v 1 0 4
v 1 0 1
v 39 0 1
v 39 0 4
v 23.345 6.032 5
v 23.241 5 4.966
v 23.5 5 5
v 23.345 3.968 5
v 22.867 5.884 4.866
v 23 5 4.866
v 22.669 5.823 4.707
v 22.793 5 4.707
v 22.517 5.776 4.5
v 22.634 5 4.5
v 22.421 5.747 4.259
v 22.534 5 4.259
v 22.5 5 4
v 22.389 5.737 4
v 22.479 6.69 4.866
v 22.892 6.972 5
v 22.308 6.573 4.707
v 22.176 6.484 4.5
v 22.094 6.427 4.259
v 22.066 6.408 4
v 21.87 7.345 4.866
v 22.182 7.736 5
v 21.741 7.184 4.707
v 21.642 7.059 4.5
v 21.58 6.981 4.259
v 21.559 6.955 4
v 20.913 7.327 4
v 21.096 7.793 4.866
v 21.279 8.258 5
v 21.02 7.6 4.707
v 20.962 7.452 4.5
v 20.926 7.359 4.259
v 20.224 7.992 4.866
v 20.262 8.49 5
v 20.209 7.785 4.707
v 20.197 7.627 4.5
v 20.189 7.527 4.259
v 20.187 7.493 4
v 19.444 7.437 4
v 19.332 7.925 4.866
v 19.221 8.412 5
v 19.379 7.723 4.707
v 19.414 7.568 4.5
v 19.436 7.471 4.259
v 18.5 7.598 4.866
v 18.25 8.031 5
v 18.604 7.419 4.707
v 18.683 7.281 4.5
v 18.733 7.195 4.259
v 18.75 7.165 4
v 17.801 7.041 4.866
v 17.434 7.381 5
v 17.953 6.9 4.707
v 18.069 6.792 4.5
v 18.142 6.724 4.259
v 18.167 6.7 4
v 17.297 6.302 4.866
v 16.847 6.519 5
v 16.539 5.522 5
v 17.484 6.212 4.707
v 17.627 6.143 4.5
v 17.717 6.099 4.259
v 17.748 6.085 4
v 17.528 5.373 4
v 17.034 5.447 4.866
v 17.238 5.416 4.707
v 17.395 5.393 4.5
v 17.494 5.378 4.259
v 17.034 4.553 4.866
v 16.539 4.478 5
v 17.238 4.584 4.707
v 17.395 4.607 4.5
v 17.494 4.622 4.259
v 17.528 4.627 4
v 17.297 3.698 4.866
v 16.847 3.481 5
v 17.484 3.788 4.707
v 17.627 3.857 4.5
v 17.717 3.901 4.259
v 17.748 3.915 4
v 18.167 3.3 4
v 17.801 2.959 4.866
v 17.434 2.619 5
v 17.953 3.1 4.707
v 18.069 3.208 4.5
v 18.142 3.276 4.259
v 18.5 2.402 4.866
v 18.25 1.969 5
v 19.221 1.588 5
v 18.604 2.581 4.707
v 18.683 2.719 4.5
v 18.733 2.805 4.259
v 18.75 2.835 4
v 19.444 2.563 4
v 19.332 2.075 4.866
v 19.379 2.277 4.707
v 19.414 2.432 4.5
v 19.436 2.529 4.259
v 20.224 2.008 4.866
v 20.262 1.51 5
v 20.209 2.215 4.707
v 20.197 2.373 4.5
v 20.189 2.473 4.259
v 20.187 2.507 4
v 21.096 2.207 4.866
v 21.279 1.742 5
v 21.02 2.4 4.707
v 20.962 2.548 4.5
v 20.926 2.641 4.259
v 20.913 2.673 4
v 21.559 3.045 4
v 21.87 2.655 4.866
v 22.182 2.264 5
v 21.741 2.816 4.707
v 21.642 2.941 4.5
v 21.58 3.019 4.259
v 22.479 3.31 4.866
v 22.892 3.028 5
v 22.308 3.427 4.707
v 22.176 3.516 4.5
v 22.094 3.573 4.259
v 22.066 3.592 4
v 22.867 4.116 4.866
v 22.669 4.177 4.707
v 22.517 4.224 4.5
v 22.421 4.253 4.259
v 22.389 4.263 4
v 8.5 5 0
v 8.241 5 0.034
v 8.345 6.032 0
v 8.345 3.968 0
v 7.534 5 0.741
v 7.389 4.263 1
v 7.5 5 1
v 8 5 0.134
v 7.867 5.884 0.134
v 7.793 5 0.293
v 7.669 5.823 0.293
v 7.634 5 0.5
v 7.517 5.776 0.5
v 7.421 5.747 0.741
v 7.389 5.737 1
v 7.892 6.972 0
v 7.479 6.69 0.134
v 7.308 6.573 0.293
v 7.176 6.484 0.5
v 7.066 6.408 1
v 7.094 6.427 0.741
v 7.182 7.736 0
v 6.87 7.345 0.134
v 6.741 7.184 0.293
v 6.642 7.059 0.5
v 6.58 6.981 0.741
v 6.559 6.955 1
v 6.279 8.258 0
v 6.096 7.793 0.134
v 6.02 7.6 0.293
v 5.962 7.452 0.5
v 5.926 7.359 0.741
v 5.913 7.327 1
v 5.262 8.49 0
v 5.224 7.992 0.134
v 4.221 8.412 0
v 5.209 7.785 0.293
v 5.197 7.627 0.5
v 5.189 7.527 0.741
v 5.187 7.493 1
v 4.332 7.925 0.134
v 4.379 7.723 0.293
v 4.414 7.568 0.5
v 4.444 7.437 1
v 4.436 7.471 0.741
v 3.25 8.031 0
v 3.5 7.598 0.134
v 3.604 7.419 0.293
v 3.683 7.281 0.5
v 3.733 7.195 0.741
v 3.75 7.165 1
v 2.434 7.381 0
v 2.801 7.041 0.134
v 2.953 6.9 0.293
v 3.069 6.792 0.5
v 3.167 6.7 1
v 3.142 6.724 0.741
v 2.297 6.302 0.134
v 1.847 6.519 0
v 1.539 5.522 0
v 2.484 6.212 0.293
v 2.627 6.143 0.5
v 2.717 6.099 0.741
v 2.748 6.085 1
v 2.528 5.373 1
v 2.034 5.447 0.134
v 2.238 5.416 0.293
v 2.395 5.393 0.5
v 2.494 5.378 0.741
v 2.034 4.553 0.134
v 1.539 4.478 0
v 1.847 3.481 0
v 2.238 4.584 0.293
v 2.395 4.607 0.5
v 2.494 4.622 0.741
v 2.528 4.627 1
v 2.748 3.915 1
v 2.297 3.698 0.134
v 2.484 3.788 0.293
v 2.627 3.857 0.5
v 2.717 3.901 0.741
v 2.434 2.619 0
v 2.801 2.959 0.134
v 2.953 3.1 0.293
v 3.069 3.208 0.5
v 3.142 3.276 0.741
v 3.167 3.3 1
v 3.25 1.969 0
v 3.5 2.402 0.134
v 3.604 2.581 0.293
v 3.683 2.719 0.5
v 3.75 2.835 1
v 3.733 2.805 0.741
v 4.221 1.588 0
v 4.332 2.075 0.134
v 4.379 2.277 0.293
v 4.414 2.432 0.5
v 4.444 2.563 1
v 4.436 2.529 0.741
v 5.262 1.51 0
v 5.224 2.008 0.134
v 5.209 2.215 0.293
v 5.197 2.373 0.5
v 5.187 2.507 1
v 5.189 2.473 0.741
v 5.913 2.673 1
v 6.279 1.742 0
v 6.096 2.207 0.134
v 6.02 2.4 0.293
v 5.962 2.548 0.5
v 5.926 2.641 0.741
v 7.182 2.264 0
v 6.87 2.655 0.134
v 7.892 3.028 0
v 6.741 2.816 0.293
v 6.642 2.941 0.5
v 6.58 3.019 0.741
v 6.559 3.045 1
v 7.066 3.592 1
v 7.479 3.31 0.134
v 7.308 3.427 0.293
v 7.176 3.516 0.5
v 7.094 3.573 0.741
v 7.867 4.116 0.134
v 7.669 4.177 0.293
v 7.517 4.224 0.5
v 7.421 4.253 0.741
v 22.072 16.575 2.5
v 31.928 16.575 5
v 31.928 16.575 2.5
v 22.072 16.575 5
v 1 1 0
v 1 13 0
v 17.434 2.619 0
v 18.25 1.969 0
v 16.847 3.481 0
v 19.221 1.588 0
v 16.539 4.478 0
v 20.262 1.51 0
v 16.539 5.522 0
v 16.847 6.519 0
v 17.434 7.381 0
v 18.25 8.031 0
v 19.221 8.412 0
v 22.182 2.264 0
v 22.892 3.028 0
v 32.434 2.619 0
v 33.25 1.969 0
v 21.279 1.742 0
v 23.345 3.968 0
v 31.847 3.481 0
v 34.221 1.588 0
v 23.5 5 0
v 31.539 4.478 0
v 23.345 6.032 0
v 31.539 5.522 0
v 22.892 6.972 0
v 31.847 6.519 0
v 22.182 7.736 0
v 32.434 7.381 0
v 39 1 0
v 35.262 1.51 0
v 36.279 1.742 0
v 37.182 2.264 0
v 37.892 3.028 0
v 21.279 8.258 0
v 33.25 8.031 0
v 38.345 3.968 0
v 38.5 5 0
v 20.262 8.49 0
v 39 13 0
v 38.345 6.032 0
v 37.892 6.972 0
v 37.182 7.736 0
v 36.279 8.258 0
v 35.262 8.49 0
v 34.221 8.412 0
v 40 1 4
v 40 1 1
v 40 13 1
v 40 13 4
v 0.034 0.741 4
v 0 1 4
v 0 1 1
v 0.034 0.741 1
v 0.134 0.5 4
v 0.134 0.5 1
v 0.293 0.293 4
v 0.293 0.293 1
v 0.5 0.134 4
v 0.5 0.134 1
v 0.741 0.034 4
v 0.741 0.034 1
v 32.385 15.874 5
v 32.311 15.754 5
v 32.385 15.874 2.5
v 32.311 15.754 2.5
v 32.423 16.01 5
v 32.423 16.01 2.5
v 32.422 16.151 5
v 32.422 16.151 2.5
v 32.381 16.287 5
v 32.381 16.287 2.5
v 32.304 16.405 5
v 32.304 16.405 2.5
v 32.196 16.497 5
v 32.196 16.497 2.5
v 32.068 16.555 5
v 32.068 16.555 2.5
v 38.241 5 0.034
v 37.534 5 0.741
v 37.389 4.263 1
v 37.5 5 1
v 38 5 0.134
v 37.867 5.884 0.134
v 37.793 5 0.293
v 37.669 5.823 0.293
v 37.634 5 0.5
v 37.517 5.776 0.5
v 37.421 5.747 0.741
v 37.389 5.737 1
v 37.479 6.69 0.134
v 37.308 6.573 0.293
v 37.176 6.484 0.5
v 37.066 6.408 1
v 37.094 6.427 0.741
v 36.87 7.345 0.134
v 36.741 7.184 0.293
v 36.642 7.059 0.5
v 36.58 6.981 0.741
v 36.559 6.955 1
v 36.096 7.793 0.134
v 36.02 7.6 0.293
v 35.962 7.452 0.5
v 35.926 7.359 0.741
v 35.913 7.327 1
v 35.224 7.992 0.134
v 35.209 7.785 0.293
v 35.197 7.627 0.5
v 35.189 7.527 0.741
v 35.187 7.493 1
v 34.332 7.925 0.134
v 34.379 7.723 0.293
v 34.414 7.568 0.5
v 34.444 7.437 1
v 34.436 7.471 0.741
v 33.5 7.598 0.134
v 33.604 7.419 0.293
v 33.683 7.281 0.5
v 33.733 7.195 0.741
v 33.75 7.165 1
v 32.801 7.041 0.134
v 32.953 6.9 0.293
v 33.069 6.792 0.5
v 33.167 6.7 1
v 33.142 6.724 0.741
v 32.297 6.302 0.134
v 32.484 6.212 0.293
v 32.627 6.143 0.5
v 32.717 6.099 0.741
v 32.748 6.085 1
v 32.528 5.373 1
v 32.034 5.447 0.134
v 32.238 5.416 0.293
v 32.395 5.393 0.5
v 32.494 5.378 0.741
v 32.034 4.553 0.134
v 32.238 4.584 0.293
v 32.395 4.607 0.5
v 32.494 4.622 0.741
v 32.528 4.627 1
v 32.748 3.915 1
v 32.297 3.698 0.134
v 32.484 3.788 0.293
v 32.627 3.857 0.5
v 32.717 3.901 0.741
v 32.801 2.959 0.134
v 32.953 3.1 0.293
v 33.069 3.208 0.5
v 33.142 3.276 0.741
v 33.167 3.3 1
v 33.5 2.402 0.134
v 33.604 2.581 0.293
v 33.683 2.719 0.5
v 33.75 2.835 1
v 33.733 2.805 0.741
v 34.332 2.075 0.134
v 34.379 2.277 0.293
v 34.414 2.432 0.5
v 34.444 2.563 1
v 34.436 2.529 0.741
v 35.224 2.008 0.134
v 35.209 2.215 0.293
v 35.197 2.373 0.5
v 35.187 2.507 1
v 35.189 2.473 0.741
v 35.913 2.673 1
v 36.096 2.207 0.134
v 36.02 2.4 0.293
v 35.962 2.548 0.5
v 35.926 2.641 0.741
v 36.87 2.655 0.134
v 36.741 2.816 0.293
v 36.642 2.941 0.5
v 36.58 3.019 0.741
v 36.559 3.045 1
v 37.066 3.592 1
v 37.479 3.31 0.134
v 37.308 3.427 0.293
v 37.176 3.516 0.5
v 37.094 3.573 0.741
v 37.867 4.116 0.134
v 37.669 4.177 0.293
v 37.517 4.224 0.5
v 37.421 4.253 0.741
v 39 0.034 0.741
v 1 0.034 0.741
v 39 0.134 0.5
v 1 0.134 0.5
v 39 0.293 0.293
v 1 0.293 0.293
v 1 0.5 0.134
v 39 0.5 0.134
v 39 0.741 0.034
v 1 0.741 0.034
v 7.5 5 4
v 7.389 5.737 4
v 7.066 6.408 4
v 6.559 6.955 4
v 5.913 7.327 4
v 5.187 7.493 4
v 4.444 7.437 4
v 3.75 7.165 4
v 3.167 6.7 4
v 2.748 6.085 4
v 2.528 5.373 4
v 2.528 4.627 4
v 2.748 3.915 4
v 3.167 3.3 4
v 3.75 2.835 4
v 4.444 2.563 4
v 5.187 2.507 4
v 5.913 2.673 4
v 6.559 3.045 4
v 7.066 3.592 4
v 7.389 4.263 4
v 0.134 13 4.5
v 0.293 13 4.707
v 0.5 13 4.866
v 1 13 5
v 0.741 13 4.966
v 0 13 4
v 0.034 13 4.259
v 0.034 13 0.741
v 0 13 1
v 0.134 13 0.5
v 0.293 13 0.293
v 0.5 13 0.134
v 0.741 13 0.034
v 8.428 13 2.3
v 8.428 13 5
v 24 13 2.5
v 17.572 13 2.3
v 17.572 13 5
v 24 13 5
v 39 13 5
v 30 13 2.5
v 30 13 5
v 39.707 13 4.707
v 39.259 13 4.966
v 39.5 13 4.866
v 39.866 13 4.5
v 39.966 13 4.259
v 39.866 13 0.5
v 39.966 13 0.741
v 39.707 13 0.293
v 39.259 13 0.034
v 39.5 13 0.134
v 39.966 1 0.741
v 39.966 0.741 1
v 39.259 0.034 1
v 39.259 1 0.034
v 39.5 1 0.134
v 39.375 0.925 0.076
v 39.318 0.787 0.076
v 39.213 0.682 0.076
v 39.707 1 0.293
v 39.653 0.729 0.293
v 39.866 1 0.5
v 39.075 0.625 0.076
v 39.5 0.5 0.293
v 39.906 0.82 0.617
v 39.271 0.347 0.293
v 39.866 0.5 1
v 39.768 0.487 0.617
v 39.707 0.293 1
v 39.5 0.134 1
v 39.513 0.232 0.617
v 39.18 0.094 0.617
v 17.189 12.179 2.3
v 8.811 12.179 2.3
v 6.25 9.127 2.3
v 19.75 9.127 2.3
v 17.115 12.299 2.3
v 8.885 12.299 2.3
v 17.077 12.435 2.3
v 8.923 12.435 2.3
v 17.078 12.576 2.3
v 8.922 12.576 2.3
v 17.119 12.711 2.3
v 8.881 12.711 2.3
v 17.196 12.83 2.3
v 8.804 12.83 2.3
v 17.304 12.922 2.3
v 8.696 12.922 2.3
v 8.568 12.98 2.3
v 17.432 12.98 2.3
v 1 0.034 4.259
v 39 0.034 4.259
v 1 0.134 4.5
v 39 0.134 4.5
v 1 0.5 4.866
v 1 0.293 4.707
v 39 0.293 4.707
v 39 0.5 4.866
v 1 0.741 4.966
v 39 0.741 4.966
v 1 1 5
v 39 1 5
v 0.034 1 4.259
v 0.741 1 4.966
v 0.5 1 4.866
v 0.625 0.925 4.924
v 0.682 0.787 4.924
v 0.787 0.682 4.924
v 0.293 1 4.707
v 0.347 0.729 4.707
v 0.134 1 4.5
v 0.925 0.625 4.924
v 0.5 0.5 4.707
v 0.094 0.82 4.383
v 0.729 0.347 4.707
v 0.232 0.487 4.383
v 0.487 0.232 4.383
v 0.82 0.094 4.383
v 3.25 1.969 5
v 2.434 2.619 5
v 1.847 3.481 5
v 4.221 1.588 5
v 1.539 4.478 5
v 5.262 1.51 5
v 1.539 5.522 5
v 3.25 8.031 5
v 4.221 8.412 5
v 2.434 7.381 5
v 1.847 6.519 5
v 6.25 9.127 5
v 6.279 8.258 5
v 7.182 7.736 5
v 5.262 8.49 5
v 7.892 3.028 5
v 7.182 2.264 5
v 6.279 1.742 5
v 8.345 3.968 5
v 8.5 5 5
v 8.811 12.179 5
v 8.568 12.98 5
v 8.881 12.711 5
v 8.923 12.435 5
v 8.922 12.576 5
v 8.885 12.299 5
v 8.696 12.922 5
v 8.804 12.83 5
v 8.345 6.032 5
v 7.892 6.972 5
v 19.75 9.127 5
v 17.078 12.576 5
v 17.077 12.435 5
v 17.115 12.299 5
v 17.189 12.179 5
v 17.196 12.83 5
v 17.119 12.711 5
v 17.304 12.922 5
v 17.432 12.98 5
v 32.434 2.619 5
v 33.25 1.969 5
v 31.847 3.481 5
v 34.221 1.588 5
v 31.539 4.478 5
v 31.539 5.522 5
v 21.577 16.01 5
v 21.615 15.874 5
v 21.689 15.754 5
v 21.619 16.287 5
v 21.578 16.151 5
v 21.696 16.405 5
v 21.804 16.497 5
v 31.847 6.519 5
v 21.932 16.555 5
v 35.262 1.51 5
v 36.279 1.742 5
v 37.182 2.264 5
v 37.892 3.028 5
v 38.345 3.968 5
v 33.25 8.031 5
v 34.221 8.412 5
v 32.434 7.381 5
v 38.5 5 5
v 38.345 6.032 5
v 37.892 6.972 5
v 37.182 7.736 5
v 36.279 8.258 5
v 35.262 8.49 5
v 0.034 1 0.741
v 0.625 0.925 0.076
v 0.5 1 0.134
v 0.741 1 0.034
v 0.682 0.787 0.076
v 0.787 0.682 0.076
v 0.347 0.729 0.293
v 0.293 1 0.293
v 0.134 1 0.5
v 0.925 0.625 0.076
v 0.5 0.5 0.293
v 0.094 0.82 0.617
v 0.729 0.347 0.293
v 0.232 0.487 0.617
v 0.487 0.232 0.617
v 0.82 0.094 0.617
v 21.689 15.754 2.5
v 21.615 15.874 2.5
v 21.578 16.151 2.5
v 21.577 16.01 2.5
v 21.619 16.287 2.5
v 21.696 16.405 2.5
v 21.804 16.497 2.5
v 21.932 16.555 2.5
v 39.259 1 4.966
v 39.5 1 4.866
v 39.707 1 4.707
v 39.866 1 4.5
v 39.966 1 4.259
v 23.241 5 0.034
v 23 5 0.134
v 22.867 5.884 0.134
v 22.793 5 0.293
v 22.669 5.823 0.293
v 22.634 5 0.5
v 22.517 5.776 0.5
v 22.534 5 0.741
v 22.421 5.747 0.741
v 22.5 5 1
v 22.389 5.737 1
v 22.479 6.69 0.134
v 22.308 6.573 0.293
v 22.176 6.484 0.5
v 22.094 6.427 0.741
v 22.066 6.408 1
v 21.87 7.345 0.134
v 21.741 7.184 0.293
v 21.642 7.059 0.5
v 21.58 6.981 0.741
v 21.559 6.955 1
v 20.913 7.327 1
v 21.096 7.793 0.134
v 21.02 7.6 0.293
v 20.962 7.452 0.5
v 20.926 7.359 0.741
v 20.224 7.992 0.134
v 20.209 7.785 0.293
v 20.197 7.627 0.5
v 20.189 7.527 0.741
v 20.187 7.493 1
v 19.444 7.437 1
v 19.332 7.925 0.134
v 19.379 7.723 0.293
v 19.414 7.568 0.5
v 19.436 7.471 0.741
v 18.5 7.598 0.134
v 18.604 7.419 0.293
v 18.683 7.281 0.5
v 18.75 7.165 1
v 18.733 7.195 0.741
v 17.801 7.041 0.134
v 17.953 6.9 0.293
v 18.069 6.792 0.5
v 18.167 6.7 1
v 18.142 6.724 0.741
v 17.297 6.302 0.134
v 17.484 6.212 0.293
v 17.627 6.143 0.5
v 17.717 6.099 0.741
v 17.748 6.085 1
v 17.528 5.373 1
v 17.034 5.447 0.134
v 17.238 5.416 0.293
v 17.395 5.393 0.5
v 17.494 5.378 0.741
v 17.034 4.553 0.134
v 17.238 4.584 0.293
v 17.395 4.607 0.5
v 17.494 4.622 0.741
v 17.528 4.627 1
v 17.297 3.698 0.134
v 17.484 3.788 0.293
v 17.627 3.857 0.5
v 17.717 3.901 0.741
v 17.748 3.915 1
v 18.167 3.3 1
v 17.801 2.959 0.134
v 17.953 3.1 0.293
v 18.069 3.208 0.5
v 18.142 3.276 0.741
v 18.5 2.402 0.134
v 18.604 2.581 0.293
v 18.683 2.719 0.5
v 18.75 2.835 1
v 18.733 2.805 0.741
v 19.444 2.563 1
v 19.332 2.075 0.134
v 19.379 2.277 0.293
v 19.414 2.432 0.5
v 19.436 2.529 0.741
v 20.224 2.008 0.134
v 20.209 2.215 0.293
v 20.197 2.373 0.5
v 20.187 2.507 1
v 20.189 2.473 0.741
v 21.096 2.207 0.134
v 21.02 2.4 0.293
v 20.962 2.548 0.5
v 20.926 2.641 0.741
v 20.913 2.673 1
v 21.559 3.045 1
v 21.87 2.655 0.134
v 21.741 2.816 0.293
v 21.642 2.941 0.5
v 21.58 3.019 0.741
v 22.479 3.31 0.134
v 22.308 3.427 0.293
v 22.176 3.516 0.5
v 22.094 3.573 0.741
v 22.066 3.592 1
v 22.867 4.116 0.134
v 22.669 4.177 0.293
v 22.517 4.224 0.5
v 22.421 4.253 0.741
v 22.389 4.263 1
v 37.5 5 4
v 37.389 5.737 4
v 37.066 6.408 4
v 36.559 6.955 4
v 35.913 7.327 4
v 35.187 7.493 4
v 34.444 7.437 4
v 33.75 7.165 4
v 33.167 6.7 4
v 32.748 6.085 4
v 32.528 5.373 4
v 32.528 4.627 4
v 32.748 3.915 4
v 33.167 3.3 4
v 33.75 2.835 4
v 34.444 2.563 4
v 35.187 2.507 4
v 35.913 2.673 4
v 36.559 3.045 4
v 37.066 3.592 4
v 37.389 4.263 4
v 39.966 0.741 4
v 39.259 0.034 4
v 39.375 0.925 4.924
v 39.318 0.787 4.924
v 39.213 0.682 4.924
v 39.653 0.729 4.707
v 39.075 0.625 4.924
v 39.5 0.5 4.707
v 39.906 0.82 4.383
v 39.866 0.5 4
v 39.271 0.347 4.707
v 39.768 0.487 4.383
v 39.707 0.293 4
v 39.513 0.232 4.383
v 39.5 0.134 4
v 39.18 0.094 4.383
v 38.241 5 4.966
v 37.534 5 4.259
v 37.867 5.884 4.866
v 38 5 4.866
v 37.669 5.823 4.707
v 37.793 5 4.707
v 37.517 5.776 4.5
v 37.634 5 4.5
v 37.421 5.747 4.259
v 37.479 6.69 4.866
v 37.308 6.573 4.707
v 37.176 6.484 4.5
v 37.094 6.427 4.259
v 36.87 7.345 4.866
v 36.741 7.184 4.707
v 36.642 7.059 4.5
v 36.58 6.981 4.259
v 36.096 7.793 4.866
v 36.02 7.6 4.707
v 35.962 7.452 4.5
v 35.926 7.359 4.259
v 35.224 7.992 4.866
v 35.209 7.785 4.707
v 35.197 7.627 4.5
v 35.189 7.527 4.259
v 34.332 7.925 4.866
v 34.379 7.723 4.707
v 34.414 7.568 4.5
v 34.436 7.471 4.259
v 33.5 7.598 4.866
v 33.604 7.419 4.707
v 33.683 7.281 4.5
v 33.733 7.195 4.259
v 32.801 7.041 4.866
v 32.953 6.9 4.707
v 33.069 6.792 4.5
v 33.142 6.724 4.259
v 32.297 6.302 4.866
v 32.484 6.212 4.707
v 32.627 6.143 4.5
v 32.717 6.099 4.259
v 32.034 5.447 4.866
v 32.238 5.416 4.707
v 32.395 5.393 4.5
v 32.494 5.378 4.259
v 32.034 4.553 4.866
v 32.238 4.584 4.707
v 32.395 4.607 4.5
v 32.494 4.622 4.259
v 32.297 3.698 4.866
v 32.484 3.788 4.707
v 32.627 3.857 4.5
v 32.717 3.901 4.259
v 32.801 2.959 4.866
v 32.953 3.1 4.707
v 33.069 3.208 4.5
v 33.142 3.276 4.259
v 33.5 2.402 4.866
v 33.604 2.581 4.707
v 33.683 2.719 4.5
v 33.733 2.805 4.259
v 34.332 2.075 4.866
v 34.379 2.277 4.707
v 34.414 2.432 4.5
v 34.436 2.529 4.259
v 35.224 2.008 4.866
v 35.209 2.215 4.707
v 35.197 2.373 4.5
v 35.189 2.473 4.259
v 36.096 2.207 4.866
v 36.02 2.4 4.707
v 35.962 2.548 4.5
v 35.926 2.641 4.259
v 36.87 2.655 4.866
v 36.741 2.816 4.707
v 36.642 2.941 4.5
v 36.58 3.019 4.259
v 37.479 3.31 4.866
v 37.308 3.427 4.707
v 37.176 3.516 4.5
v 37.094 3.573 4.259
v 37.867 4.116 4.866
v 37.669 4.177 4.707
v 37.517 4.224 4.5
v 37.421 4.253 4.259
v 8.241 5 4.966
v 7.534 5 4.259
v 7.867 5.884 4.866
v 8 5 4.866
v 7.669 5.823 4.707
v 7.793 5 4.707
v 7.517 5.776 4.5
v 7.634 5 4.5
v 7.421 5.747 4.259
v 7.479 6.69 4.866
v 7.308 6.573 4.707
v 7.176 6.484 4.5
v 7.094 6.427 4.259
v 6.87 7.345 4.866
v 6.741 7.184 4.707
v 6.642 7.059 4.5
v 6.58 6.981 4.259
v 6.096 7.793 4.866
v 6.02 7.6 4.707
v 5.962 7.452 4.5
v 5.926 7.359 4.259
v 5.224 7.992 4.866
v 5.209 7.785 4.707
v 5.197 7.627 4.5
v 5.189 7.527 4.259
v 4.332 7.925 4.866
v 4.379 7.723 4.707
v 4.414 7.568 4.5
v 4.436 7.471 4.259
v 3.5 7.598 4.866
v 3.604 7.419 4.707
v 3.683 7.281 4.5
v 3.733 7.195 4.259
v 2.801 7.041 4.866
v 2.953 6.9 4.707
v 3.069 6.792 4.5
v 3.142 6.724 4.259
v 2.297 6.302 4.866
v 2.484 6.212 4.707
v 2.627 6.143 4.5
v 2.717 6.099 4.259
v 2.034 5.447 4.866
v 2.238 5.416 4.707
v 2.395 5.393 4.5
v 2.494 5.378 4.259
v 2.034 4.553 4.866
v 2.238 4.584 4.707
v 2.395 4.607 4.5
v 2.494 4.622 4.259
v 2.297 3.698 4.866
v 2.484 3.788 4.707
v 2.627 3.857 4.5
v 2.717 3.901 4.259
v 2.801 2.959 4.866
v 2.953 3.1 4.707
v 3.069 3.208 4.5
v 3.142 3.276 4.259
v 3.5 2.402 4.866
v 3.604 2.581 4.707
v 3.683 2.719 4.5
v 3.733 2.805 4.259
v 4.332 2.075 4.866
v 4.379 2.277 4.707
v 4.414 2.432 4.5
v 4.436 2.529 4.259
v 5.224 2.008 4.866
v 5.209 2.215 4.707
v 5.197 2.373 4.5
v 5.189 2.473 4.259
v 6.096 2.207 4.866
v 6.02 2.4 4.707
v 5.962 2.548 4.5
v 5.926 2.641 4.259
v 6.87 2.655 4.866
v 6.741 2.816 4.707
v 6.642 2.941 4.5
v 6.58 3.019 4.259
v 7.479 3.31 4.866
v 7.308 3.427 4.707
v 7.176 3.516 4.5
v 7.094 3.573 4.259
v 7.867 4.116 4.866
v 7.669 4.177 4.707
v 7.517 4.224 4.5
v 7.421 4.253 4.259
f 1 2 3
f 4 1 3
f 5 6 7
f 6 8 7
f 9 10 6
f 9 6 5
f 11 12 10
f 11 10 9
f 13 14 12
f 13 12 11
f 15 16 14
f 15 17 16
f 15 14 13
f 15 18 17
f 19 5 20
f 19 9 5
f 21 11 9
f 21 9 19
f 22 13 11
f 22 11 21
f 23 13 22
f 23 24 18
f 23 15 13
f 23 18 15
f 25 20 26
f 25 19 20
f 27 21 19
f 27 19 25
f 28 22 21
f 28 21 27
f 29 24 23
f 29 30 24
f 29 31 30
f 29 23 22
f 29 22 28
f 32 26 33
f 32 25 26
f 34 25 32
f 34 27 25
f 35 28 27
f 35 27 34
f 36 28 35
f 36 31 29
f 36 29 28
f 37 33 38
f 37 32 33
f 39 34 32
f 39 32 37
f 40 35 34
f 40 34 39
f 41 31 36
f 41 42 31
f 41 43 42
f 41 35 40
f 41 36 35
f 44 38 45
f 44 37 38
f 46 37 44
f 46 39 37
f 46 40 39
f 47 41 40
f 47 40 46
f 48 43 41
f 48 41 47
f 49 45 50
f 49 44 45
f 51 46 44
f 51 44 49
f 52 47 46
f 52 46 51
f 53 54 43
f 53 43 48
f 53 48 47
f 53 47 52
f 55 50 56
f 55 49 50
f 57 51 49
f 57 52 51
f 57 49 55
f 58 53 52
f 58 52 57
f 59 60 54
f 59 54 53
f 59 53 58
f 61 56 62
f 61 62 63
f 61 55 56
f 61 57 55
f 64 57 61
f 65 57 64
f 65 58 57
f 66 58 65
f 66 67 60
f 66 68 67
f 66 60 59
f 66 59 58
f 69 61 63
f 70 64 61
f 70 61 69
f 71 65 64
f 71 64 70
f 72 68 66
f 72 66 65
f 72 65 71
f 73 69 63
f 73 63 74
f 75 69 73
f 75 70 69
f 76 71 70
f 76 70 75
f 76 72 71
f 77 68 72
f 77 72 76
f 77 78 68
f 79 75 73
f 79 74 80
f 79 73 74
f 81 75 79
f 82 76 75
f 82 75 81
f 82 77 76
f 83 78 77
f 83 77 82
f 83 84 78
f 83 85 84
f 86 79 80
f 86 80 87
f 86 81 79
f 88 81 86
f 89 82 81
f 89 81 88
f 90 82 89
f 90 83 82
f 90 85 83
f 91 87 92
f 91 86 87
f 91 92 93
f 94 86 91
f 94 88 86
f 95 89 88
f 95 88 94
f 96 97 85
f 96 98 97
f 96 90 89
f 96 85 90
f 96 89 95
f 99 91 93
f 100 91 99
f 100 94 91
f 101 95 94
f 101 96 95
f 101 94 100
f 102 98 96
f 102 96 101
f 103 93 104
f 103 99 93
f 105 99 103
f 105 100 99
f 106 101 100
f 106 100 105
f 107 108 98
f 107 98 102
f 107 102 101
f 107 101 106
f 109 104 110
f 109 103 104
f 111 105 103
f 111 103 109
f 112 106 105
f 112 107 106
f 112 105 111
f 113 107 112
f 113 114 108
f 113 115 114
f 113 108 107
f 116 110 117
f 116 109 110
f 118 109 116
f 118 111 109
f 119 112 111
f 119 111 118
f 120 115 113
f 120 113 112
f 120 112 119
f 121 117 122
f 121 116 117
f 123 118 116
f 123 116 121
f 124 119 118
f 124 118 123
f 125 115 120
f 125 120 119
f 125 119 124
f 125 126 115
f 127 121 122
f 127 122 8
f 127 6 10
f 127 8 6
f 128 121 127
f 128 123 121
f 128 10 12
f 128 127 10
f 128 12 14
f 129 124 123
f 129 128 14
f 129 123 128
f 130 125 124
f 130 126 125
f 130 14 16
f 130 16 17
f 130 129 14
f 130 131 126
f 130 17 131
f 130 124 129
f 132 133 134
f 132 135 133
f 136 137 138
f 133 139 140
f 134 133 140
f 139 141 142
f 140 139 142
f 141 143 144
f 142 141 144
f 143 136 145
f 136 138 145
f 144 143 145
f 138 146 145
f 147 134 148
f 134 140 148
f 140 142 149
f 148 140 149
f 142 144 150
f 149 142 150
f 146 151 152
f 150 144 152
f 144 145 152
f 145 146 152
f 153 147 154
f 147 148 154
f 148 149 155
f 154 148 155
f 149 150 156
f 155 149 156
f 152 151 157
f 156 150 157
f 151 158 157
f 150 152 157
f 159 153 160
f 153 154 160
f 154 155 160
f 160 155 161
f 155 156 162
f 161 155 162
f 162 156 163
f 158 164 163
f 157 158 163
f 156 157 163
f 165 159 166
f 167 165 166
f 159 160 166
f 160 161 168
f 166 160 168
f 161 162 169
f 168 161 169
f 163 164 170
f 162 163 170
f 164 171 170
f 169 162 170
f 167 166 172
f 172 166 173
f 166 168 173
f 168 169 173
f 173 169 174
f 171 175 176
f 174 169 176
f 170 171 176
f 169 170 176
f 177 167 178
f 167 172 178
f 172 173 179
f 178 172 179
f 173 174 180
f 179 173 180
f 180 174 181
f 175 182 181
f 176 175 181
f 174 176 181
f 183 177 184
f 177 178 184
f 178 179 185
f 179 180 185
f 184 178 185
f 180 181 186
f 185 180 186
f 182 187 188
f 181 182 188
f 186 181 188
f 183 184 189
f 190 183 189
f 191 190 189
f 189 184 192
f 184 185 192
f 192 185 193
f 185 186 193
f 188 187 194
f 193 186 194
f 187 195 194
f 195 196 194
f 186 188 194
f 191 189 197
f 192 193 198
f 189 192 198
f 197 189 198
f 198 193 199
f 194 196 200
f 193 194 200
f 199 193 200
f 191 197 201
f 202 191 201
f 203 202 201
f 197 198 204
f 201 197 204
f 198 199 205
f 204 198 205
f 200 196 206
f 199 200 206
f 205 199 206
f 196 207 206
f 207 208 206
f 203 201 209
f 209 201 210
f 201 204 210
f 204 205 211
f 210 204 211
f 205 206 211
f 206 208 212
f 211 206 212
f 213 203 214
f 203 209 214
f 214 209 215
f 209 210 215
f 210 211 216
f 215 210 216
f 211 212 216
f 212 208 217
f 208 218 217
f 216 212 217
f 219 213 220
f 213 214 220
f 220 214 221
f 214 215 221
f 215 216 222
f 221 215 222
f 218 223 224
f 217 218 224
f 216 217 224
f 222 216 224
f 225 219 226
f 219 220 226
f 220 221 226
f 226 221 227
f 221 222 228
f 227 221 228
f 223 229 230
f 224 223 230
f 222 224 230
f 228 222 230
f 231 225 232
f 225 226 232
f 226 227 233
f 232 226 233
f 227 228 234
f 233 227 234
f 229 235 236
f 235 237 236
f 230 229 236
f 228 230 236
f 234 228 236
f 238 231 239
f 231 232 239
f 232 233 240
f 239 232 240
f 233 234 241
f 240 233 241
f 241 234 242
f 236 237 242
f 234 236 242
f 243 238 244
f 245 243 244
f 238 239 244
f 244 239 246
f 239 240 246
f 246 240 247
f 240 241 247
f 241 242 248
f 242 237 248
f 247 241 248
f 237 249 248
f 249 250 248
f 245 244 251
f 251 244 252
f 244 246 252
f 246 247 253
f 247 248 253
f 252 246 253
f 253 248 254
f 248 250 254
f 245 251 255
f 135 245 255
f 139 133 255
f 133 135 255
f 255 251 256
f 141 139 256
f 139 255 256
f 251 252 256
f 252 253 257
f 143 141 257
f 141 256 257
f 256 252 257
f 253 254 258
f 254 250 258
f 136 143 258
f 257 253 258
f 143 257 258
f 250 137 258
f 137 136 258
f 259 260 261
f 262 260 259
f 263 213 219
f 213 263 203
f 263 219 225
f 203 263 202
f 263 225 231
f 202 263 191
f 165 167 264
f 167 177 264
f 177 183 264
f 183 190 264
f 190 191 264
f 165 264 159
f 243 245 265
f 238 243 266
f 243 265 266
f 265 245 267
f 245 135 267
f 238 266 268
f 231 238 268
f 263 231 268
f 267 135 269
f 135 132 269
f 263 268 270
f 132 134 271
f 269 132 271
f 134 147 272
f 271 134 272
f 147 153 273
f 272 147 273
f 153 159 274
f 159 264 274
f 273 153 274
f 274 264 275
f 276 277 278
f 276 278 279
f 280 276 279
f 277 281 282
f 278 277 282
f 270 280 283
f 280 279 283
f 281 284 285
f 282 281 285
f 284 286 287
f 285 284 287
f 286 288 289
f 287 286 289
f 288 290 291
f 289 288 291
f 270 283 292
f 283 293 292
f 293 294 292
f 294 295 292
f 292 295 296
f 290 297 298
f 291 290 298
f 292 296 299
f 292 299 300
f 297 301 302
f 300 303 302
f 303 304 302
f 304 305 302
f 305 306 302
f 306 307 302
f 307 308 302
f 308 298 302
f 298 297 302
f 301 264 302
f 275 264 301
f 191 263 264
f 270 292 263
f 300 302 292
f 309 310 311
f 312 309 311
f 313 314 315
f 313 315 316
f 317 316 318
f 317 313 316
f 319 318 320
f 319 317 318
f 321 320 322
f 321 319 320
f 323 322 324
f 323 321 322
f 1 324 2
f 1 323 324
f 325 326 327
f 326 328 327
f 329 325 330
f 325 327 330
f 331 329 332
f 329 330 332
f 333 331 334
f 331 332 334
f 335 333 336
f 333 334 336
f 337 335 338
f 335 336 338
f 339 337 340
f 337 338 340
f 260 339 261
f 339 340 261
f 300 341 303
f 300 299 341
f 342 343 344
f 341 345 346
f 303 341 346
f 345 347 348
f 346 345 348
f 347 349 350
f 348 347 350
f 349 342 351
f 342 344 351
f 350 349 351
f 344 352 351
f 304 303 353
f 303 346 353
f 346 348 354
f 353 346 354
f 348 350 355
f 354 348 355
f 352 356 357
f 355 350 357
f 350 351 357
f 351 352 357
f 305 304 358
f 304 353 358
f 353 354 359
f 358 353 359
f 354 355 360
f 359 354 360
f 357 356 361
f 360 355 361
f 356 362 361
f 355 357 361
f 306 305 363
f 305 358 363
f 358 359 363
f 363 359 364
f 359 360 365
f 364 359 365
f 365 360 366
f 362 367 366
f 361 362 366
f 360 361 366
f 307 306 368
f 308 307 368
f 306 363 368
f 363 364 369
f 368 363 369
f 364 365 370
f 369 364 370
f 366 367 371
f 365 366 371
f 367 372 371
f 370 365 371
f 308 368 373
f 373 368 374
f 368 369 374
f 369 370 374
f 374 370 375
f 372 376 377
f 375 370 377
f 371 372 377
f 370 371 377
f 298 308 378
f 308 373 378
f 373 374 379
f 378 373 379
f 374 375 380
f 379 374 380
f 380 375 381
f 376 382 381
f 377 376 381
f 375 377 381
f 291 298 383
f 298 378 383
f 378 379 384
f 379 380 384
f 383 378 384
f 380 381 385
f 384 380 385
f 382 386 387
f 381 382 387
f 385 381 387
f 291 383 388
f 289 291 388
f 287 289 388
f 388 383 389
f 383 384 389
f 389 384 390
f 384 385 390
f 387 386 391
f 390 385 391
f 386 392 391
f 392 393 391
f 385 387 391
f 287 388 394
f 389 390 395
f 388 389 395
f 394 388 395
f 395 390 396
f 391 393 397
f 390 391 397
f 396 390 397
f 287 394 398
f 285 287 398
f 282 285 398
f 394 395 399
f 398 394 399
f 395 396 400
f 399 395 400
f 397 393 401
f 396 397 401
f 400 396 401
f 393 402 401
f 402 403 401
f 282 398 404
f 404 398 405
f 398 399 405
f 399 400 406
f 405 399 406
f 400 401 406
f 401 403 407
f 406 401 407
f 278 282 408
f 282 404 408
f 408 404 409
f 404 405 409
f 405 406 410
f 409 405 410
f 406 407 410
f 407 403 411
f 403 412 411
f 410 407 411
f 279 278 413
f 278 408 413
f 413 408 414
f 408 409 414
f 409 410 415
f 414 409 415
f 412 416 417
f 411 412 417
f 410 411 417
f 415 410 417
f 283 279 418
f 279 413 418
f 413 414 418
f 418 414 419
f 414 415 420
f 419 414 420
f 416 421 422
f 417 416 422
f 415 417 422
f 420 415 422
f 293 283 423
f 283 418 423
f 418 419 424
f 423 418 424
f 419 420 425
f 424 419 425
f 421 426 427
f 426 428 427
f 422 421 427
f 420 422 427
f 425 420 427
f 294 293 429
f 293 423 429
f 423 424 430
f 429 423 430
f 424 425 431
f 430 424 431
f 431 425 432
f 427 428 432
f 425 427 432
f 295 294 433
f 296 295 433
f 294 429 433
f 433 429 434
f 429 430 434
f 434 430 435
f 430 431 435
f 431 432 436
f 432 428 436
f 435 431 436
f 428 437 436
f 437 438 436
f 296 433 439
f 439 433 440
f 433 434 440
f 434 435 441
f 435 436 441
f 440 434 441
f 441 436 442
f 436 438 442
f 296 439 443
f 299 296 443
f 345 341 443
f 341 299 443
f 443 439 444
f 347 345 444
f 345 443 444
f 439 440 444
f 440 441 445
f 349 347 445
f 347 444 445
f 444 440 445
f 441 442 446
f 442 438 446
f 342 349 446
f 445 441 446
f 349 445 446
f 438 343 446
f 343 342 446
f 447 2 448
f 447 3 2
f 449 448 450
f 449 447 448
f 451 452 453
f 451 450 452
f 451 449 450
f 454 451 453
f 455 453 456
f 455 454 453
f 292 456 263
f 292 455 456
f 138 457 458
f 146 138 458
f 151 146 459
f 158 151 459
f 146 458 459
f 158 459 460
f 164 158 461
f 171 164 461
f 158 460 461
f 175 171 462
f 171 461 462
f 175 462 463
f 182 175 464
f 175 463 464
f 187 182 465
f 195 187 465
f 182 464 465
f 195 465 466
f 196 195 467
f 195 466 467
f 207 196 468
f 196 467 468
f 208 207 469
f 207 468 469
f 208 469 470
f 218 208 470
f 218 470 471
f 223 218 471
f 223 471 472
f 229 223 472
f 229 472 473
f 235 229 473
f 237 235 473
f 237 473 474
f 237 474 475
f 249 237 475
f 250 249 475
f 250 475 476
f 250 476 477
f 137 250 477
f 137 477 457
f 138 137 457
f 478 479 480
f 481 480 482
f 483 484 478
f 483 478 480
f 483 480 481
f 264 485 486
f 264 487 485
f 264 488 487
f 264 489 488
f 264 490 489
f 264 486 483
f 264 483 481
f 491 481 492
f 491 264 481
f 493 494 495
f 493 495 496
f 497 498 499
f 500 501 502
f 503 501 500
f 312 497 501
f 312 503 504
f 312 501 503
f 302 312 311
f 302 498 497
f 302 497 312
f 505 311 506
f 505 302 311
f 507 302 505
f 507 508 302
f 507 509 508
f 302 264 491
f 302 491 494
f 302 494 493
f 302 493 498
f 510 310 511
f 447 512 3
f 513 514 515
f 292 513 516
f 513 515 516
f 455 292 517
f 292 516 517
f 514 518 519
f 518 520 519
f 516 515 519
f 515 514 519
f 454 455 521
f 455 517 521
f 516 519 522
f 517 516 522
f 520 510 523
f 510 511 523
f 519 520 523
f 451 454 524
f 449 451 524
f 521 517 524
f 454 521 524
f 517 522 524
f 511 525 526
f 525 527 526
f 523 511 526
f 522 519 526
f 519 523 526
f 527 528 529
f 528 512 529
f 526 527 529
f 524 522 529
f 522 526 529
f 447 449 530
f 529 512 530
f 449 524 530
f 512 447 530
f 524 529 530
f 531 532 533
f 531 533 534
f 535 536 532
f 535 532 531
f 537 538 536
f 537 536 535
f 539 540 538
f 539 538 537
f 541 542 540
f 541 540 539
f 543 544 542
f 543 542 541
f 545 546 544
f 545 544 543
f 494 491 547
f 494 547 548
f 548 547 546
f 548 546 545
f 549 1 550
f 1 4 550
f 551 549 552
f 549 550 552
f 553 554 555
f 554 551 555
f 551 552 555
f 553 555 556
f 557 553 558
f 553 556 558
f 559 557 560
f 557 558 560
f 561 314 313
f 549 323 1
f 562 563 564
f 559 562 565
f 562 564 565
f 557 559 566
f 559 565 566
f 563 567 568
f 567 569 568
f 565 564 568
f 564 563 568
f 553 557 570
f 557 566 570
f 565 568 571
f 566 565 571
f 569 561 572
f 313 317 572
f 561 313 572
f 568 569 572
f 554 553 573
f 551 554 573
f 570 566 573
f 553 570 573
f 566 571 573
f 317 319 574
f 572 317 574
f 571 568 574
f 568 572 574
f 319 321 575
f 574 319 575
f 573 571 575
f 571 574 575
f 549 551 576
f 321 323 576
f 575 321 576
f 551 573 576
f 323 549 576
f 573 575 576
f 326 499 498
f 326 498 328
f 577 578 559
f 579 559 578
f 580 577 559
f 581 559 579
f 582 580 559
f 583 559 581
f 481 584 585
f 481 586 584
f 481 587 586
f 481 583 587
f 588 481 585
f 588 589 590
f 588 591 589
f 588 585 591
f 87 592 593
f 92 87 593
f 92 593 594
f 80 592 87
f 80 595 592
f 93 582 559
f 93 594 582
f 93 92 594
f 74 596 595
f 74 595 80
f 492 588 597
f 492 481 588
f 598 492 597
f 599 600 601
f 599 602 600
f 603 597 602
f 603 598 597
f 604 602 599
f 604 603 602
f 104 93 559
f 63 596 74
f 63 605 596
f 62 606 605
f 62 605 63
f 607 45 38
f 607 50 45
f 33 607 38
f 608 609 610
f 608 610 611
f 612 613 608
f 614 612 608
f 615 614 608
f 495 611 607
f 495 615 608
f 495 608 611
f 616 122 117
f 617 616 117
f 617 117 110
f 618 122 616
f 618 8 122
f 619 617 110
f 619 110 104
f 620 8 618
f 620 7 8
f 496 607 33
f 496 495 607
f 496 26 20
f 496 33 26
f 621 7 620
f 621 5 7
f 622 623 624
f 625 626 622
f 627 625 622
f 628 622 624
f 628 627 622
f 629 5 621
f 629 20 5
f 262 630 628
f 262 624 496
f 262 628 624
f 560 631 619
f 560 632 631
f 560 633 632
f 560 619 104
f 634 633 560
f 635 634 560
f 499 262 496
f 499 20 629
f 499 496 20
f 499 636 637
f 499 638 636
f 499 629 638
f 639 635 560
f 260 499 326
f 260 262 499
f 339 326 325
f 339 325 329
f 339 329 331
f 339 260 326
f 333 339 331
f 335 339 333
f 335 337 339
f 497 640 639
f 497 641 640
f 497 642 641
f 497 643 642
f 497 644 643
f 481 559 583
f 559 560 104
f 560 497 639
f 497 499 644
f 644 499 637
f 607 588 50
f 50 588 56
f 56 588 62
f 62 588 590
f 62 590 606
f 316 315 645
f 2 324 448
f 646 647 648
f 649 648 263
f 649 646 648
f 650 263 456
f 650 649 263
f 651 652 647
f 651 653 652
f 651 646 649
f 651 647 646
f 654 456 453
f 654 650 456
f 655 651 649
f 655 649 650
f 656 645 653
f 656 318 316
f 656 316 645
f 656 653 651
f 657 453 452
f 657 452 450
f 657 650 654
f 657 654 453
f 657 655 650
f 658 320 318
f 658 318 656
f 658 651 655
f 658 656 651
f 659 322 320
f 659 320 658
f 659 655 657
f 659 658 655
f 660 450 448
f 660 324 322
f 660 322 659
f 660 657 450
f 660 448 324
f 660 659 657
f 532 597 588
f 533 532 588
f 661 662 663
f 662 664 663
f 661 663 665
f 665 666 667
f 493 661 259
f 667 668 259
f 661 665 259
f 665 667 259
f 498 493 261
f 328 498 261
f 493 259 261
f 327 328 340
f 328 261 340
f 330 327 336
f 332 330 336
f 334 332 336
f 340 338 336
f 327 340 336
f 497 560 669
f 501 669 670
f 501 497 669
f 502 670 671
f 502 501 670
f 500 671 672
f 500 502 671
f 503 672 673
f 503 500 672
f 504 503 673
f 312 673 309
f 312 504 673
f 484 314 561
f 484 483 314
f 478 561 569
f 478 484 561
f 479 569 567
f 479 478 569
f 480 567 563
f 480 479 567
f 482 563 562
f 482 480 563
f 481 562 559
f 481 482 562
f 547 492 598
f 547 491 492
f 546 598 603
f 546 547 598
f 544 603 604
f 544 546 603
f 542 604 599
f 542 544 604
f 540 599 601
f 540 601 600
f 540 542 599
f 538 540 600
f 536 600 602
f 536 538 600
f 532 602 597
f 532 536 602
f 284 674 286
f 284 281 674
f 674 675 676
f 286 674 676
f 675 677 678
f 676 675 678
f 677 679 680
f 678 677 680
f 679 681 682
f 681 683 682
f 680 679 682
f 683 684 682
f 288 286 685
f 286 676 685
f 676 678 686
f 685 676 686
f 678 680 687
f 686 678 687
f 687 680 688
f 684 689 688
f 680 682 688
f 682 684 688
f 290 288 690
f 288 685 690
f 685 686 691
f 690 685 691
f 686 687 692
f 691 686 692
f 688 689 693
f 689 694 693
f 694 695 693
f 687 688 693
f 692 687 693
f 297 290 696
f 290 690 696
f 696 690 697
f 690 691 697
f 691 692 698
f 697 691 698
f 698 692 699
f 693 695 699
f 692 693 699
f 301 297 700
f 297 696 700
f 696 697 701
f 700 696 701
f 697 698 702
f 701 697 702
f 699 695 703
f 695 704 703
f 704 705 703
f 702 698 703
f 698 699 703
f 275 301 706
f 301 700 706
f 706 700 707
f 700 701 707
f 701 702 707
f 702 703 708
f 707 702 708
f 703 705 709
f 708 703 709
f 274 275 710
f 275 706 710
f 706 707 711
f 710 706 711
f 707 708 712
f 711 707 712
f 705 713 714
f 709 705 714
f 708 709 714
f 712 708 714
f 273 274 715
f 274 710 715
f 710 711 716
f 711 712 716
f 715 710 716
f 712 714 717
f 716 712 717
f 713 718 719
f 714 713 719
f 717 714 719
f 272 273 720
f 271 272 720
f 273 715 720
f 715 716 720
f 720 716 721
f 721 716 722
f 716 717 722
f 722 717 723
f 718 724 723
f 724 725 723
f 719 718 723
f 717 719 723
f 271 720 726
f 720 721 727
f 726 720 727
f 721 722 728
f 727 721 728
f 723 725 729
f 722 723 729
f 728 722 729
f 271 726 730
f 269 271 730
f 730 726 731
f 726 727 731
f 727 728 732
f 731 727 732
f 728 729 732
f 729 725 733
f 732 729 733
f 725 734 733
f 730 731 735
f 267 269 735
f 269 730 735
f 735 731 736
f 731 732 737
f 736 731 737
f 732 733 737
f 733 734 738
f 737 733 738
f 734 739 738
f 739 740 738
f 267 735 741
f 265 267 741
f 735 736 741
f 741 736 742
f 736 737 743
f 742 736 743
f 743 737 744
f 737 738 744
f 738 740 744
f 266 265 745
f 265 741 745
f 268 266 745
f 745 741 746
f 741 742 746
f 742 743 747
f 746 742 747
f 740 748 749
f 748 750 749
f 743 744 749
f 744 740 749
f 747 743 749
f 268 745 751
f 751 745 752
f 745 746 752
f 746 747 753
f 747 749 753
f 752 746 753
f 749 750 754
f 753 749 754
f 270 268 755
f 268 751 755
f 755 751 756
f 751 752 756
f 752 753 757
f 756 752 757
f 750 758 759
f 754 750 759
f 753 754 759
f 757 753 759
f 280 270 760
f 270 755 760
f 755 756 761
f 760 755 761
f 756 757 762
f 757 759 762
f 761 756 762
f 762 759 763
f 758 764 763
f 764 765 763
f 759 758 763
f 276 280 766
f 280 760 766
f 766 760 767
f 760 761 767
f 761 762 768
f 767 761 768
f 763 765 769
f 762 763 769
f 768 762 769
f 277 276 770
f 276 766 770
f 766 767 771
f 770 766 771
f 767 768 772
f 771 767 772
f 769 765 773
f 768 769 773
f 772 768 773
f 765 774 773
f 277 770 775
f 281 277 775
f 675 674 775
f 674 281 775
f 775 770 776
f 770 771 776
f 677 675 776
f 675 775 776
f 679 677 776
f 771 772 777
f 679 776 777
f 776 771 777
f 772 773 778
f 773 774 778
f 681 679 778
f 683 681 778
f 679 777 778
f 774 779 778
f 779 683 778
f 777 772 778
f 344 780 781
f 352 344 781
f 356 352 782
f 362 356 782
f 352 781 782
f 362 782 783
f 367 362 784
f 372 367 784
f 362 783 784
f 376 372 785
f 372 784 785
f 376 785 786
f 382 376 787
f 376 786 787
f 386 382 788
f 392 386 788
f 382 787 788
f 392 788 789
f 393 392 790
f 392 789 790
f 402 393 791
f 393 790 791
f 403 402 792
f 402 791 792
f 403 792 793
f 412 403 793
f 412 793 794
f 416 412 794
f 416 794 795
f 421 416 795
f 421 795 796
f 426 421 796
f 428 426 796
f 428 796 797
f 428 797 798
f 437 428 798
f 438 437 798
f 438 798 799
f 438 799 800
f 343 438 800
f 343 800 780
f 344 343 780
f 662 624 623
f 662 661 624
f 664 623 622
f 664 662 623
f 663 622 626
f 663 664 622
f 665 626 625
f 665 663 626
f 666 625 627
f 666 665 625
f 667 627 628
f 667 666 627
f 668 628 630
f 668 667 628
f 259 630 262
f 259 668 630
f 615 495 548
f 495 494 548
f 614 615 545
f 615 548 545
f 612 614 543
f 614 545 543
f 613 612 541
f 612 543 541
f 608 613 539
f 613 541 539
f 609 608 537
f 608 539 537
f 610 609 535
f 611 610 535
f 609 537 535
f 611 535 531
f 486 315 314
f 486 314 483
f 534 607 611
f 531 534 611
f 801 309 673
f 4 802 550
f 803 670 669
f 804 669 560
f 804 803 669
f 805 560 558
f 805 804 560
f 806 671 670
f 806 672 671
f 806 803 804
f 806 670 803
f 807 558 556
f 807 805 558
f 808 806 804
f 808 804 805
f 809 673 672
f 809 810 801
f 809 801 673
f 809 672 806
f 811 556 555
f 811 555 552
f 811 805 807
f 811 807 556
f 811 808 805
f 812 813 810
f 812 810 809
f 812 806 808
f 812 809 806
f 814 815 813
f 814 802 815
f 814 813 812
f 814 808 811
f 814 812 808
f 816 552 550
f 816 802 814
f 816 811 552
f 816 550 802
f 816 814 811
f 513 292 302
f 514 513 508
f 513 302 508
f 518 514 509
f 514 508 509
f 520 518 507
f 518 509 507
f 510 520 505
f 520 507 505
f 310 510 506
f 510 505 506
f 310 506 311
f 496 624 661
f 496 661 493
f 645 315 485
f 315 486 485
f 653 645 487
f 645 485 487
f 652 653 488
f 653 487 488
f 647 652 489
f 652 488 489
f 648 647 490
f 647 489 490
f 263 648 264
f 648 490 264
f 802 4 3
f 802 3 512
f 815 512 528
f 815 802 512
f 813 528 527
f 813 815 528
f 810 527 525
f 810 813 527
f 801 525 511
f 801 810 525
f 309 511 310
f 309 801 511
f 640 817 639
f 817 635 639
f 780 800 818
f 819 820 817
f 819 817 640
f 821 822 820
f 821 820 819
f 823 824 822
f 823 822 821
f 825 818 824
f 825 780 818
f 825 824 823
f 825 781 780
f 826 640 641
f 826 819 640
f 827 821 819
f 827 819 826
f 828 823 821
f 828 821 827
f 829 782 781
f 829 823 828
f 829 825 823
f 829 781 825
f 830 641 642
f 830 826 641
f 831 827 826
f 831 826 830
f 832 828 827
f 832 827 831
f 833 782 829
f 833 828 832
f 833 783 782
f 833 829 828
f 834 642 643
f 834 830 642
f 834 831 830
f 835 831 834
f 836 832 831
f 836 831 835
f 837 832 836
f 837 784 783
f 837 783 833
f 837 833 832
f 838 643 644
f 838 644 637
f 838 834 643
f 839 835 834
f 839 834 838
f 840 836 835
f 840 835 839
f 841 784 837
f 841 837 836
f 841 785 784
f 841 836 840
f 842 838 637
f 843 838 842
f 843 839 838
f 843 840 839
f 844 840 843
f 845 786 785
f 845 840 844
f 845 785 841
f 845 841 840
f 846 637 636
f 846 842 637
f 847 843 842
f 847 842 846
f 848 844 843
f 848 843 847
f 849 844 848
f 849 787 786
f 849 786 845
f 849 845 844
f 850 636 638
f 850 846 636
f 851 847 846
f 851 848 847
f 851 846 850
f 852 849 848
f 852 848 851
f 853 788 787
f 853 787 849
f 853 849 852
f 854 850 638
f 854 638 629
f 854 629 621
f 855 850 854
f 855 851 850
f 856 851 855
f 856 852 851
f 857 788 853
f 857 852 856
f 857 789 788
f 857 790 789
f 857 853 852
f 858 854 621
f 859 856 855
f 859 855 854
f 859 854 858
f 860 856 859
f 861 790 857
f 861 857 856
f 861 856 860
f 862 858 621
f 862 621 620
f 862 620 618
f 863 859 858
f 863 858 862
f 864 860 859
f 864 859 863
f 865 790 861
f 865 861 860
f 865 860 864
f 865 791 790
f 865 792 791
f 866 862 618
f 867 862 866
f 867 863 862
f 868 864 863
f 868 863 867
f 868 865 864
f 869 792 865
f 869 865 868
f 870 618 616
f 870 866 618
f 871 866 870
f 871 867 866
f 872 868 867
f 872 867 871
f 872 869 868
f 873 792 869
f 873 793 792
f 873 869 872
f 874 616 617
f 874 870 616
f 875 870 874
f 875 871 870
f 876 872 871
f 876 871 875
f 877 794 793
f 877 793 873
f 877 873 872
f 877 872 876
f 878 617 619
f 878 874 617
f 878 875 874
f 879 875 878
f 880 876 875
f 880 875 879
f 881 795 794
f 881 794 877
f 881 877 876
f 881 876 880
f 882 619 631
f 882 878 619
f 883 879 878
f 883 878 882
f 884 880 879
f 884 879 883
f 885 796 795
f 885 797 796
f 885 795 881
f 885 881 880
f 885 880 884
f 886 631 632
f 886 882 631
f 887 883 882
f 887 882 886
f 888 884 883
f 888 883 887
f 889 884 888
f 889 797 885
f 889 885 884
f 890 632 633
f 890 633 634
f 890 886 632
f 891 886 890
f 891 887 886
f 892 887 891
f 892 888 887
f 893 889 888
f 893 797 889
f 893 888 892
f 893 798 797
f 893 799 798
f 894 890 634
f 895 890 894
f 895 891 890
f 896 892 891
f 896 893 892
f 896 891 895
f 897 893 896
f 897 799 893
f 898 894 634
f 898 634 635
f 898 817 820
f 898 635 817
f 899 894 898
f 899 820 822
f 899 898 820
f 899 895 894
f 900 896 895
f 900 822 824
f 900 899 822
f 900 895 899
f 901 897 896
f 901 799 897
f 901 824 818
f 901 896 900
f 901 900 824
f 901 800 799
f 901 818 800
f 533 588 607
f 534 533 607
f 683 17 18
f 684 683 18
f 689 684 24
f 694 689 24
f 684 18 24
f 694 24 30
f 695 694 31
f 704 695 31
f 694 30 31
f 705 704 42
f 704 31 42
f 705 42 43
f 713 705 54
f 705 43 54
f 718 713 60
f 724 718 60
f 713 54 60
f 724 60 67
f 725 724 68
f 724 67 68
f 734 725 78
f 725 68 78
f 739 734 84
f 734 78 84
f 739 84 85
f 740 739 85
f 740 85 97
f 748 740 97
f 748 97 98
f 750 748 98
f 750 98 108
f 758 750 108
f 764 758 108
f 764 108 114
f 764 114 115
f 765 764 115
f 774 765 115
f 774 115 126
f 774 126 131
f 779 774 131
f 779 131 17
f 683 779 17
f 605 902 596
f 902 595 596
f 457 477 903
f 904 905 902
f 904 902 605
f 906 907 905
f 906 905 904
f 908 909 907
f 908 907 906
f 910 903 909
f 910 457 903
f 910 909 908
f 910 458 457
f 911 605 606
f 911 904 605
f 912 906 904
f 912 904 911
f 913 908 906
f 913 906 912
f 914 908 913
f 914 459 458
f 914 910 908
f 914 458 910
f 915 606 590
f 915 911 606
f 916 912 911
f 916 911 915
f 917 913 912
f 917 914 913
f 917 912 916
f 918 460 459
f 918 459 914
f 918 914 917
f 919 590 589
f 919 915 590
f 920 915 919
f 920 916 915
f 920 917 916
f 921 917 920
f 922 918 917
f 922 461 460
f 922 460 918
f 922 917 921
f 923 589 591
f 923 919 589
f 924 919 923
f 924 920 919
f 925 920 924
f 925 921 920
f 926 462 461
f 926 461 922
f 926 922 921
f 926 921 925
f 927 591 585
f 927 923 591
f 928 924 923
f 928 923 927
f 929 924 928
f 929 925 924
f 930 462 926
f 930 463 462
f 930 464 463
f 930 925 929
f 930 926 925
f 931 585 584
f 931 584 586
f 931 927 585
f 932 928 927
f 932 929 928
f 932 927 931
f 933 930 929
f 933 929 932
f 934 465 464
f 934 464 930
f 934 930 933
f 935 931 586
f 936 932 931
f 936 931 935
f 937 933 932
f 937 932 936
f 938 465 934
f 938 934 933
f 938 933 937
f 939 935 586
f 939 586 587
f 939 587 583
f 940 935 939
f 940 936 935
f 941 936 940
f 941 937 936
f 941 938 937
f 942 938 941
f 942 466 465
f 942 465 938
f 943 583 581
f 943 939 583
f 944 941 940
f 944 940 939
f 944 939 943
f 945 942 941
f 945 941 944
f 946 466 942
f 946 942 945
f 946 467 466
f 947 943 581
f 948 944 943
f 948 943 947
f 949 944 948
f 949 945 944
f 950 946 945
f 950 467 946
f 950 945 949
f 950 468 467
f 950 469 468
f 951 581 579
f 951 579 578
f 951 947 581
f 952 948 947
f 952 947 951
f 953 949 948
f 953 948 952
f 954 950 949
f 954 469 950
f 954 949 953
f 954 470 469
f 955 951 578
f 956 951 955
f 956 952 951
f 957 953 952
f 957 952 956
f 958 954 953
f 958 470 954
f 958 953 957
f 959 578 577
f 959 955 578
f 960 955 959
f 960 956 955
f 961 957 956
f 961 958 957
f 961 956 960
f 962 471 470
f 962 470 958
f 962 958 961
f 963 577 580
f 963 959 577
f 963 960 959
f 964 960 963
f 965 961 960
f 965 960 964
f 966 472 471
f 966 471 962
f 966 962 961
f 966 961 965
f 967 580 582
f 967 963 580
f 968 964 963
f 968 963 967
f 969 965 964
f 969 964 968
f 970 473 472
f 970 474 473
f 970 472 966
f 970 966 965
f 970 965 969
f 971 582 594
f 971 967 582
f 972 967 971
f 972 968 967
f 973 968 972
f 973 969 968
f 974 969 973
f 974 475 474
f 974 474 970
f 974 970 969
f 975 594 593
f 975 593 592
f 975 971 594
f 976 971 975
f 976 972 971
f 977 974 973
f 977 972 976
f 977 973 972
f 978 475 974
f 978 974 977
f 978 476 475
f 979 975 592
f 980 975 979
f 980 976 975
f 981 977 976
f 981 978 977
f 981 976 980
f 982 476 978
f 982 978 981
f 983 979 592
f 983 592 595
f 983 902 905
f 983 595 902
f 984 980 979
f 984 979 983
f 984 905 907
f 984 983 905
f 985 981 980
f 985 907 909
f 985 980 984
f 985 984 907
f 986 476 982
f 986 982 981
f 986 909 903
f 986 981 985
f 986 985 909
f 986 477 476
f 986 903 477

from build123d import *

# Parameters (mm, degrees)
F0_W     = 40
F0_H     = 13
F1_DEPTH = 5
F2_R     = 2.5
F3_DEPTH = 5.001
F5_DEPTH = 2.5
F7_DEPTH = 2.7
F8_R     = 1
F9_R     = 1
F10_R    = 0.5


with BuildPart() as f1:
    # F0 (on Top) → F1 (new body)
    with BuildSketch(Plane.XY):
        with Locations((20, 6.5)):
            Rectangle(F0_W, F0_H)
    extrude(amount=F1_DEPTH)

    # F2 (on face) → F3 (cut, through all)
    with BuildSketch(Plane.XY.offset(5)):
        with Locations((5, 5)):
            Circle(F2_R)
        with Locations((20, 5)):
            Circle(F2_R)
        with Locations((35, 5)):
            Circle(F2_R)
    extrude(amount=-F3_DEPTH, mode=Mode.SUBTRACT)

    # F4 (on face) → F5 (join)
    with BuildSketch(Plane.XY.offset(5)):
        Polygon((21, 16.5752607778), (24, 13), (30, 13), (33, 16.5752607778), align=None)
    extrude(amount=-F5_DEPTH)

    # F6 (on face) → F7 (cut)
    with BuildSketch(Plane.XY.offset(5)):
        Polygon((16.5, 13), (9.5, 13), (6.25, 9.1268008241), (19.75, 9.1268008241), align=None)
    extrude(amount=-F7_DEPTH, mode=Mode.SUBTRACT)

    # F8
    f8_edges = [f1.edges().sort_by_distance(p)[0] for p in [
        (0, 0, 2.5),
        (40, 0, 2.5),
        (0, 6.5, 5),
        (0, 6.5, 0),
        (40, 6.5, 5),
        (40, 6.5, 0),
        (20, 0, 5),
        (20, 0, 0),
    ]]
    fillet(f8_edges, radius=F8_R)

    # F9
    f9_edges = [f1.edges().sort_by_distance(p)[0] for p in [
        (2.5, 5, 5),
        (17.5, 5, 5),
        (32.5, 5, 5),
        (2.5, 5, 0),
        (17.5, 5, 0),
        (32.5, 5, 0),
    ]]
    fillet(f9_edges, radius=F9_R)

    # F10
    f10_edges = [f1.edges().sort_by_distance(p)[0] for p in [
        (21, 16.575261, 3.75),
        (33, 16.575261, 3.75),
        (9.5, 13, 3.65),
        (16.5, 13, 3.65),
    ]]
    fillet(f10_edges, radius=F10_R)


solid = f1.part
